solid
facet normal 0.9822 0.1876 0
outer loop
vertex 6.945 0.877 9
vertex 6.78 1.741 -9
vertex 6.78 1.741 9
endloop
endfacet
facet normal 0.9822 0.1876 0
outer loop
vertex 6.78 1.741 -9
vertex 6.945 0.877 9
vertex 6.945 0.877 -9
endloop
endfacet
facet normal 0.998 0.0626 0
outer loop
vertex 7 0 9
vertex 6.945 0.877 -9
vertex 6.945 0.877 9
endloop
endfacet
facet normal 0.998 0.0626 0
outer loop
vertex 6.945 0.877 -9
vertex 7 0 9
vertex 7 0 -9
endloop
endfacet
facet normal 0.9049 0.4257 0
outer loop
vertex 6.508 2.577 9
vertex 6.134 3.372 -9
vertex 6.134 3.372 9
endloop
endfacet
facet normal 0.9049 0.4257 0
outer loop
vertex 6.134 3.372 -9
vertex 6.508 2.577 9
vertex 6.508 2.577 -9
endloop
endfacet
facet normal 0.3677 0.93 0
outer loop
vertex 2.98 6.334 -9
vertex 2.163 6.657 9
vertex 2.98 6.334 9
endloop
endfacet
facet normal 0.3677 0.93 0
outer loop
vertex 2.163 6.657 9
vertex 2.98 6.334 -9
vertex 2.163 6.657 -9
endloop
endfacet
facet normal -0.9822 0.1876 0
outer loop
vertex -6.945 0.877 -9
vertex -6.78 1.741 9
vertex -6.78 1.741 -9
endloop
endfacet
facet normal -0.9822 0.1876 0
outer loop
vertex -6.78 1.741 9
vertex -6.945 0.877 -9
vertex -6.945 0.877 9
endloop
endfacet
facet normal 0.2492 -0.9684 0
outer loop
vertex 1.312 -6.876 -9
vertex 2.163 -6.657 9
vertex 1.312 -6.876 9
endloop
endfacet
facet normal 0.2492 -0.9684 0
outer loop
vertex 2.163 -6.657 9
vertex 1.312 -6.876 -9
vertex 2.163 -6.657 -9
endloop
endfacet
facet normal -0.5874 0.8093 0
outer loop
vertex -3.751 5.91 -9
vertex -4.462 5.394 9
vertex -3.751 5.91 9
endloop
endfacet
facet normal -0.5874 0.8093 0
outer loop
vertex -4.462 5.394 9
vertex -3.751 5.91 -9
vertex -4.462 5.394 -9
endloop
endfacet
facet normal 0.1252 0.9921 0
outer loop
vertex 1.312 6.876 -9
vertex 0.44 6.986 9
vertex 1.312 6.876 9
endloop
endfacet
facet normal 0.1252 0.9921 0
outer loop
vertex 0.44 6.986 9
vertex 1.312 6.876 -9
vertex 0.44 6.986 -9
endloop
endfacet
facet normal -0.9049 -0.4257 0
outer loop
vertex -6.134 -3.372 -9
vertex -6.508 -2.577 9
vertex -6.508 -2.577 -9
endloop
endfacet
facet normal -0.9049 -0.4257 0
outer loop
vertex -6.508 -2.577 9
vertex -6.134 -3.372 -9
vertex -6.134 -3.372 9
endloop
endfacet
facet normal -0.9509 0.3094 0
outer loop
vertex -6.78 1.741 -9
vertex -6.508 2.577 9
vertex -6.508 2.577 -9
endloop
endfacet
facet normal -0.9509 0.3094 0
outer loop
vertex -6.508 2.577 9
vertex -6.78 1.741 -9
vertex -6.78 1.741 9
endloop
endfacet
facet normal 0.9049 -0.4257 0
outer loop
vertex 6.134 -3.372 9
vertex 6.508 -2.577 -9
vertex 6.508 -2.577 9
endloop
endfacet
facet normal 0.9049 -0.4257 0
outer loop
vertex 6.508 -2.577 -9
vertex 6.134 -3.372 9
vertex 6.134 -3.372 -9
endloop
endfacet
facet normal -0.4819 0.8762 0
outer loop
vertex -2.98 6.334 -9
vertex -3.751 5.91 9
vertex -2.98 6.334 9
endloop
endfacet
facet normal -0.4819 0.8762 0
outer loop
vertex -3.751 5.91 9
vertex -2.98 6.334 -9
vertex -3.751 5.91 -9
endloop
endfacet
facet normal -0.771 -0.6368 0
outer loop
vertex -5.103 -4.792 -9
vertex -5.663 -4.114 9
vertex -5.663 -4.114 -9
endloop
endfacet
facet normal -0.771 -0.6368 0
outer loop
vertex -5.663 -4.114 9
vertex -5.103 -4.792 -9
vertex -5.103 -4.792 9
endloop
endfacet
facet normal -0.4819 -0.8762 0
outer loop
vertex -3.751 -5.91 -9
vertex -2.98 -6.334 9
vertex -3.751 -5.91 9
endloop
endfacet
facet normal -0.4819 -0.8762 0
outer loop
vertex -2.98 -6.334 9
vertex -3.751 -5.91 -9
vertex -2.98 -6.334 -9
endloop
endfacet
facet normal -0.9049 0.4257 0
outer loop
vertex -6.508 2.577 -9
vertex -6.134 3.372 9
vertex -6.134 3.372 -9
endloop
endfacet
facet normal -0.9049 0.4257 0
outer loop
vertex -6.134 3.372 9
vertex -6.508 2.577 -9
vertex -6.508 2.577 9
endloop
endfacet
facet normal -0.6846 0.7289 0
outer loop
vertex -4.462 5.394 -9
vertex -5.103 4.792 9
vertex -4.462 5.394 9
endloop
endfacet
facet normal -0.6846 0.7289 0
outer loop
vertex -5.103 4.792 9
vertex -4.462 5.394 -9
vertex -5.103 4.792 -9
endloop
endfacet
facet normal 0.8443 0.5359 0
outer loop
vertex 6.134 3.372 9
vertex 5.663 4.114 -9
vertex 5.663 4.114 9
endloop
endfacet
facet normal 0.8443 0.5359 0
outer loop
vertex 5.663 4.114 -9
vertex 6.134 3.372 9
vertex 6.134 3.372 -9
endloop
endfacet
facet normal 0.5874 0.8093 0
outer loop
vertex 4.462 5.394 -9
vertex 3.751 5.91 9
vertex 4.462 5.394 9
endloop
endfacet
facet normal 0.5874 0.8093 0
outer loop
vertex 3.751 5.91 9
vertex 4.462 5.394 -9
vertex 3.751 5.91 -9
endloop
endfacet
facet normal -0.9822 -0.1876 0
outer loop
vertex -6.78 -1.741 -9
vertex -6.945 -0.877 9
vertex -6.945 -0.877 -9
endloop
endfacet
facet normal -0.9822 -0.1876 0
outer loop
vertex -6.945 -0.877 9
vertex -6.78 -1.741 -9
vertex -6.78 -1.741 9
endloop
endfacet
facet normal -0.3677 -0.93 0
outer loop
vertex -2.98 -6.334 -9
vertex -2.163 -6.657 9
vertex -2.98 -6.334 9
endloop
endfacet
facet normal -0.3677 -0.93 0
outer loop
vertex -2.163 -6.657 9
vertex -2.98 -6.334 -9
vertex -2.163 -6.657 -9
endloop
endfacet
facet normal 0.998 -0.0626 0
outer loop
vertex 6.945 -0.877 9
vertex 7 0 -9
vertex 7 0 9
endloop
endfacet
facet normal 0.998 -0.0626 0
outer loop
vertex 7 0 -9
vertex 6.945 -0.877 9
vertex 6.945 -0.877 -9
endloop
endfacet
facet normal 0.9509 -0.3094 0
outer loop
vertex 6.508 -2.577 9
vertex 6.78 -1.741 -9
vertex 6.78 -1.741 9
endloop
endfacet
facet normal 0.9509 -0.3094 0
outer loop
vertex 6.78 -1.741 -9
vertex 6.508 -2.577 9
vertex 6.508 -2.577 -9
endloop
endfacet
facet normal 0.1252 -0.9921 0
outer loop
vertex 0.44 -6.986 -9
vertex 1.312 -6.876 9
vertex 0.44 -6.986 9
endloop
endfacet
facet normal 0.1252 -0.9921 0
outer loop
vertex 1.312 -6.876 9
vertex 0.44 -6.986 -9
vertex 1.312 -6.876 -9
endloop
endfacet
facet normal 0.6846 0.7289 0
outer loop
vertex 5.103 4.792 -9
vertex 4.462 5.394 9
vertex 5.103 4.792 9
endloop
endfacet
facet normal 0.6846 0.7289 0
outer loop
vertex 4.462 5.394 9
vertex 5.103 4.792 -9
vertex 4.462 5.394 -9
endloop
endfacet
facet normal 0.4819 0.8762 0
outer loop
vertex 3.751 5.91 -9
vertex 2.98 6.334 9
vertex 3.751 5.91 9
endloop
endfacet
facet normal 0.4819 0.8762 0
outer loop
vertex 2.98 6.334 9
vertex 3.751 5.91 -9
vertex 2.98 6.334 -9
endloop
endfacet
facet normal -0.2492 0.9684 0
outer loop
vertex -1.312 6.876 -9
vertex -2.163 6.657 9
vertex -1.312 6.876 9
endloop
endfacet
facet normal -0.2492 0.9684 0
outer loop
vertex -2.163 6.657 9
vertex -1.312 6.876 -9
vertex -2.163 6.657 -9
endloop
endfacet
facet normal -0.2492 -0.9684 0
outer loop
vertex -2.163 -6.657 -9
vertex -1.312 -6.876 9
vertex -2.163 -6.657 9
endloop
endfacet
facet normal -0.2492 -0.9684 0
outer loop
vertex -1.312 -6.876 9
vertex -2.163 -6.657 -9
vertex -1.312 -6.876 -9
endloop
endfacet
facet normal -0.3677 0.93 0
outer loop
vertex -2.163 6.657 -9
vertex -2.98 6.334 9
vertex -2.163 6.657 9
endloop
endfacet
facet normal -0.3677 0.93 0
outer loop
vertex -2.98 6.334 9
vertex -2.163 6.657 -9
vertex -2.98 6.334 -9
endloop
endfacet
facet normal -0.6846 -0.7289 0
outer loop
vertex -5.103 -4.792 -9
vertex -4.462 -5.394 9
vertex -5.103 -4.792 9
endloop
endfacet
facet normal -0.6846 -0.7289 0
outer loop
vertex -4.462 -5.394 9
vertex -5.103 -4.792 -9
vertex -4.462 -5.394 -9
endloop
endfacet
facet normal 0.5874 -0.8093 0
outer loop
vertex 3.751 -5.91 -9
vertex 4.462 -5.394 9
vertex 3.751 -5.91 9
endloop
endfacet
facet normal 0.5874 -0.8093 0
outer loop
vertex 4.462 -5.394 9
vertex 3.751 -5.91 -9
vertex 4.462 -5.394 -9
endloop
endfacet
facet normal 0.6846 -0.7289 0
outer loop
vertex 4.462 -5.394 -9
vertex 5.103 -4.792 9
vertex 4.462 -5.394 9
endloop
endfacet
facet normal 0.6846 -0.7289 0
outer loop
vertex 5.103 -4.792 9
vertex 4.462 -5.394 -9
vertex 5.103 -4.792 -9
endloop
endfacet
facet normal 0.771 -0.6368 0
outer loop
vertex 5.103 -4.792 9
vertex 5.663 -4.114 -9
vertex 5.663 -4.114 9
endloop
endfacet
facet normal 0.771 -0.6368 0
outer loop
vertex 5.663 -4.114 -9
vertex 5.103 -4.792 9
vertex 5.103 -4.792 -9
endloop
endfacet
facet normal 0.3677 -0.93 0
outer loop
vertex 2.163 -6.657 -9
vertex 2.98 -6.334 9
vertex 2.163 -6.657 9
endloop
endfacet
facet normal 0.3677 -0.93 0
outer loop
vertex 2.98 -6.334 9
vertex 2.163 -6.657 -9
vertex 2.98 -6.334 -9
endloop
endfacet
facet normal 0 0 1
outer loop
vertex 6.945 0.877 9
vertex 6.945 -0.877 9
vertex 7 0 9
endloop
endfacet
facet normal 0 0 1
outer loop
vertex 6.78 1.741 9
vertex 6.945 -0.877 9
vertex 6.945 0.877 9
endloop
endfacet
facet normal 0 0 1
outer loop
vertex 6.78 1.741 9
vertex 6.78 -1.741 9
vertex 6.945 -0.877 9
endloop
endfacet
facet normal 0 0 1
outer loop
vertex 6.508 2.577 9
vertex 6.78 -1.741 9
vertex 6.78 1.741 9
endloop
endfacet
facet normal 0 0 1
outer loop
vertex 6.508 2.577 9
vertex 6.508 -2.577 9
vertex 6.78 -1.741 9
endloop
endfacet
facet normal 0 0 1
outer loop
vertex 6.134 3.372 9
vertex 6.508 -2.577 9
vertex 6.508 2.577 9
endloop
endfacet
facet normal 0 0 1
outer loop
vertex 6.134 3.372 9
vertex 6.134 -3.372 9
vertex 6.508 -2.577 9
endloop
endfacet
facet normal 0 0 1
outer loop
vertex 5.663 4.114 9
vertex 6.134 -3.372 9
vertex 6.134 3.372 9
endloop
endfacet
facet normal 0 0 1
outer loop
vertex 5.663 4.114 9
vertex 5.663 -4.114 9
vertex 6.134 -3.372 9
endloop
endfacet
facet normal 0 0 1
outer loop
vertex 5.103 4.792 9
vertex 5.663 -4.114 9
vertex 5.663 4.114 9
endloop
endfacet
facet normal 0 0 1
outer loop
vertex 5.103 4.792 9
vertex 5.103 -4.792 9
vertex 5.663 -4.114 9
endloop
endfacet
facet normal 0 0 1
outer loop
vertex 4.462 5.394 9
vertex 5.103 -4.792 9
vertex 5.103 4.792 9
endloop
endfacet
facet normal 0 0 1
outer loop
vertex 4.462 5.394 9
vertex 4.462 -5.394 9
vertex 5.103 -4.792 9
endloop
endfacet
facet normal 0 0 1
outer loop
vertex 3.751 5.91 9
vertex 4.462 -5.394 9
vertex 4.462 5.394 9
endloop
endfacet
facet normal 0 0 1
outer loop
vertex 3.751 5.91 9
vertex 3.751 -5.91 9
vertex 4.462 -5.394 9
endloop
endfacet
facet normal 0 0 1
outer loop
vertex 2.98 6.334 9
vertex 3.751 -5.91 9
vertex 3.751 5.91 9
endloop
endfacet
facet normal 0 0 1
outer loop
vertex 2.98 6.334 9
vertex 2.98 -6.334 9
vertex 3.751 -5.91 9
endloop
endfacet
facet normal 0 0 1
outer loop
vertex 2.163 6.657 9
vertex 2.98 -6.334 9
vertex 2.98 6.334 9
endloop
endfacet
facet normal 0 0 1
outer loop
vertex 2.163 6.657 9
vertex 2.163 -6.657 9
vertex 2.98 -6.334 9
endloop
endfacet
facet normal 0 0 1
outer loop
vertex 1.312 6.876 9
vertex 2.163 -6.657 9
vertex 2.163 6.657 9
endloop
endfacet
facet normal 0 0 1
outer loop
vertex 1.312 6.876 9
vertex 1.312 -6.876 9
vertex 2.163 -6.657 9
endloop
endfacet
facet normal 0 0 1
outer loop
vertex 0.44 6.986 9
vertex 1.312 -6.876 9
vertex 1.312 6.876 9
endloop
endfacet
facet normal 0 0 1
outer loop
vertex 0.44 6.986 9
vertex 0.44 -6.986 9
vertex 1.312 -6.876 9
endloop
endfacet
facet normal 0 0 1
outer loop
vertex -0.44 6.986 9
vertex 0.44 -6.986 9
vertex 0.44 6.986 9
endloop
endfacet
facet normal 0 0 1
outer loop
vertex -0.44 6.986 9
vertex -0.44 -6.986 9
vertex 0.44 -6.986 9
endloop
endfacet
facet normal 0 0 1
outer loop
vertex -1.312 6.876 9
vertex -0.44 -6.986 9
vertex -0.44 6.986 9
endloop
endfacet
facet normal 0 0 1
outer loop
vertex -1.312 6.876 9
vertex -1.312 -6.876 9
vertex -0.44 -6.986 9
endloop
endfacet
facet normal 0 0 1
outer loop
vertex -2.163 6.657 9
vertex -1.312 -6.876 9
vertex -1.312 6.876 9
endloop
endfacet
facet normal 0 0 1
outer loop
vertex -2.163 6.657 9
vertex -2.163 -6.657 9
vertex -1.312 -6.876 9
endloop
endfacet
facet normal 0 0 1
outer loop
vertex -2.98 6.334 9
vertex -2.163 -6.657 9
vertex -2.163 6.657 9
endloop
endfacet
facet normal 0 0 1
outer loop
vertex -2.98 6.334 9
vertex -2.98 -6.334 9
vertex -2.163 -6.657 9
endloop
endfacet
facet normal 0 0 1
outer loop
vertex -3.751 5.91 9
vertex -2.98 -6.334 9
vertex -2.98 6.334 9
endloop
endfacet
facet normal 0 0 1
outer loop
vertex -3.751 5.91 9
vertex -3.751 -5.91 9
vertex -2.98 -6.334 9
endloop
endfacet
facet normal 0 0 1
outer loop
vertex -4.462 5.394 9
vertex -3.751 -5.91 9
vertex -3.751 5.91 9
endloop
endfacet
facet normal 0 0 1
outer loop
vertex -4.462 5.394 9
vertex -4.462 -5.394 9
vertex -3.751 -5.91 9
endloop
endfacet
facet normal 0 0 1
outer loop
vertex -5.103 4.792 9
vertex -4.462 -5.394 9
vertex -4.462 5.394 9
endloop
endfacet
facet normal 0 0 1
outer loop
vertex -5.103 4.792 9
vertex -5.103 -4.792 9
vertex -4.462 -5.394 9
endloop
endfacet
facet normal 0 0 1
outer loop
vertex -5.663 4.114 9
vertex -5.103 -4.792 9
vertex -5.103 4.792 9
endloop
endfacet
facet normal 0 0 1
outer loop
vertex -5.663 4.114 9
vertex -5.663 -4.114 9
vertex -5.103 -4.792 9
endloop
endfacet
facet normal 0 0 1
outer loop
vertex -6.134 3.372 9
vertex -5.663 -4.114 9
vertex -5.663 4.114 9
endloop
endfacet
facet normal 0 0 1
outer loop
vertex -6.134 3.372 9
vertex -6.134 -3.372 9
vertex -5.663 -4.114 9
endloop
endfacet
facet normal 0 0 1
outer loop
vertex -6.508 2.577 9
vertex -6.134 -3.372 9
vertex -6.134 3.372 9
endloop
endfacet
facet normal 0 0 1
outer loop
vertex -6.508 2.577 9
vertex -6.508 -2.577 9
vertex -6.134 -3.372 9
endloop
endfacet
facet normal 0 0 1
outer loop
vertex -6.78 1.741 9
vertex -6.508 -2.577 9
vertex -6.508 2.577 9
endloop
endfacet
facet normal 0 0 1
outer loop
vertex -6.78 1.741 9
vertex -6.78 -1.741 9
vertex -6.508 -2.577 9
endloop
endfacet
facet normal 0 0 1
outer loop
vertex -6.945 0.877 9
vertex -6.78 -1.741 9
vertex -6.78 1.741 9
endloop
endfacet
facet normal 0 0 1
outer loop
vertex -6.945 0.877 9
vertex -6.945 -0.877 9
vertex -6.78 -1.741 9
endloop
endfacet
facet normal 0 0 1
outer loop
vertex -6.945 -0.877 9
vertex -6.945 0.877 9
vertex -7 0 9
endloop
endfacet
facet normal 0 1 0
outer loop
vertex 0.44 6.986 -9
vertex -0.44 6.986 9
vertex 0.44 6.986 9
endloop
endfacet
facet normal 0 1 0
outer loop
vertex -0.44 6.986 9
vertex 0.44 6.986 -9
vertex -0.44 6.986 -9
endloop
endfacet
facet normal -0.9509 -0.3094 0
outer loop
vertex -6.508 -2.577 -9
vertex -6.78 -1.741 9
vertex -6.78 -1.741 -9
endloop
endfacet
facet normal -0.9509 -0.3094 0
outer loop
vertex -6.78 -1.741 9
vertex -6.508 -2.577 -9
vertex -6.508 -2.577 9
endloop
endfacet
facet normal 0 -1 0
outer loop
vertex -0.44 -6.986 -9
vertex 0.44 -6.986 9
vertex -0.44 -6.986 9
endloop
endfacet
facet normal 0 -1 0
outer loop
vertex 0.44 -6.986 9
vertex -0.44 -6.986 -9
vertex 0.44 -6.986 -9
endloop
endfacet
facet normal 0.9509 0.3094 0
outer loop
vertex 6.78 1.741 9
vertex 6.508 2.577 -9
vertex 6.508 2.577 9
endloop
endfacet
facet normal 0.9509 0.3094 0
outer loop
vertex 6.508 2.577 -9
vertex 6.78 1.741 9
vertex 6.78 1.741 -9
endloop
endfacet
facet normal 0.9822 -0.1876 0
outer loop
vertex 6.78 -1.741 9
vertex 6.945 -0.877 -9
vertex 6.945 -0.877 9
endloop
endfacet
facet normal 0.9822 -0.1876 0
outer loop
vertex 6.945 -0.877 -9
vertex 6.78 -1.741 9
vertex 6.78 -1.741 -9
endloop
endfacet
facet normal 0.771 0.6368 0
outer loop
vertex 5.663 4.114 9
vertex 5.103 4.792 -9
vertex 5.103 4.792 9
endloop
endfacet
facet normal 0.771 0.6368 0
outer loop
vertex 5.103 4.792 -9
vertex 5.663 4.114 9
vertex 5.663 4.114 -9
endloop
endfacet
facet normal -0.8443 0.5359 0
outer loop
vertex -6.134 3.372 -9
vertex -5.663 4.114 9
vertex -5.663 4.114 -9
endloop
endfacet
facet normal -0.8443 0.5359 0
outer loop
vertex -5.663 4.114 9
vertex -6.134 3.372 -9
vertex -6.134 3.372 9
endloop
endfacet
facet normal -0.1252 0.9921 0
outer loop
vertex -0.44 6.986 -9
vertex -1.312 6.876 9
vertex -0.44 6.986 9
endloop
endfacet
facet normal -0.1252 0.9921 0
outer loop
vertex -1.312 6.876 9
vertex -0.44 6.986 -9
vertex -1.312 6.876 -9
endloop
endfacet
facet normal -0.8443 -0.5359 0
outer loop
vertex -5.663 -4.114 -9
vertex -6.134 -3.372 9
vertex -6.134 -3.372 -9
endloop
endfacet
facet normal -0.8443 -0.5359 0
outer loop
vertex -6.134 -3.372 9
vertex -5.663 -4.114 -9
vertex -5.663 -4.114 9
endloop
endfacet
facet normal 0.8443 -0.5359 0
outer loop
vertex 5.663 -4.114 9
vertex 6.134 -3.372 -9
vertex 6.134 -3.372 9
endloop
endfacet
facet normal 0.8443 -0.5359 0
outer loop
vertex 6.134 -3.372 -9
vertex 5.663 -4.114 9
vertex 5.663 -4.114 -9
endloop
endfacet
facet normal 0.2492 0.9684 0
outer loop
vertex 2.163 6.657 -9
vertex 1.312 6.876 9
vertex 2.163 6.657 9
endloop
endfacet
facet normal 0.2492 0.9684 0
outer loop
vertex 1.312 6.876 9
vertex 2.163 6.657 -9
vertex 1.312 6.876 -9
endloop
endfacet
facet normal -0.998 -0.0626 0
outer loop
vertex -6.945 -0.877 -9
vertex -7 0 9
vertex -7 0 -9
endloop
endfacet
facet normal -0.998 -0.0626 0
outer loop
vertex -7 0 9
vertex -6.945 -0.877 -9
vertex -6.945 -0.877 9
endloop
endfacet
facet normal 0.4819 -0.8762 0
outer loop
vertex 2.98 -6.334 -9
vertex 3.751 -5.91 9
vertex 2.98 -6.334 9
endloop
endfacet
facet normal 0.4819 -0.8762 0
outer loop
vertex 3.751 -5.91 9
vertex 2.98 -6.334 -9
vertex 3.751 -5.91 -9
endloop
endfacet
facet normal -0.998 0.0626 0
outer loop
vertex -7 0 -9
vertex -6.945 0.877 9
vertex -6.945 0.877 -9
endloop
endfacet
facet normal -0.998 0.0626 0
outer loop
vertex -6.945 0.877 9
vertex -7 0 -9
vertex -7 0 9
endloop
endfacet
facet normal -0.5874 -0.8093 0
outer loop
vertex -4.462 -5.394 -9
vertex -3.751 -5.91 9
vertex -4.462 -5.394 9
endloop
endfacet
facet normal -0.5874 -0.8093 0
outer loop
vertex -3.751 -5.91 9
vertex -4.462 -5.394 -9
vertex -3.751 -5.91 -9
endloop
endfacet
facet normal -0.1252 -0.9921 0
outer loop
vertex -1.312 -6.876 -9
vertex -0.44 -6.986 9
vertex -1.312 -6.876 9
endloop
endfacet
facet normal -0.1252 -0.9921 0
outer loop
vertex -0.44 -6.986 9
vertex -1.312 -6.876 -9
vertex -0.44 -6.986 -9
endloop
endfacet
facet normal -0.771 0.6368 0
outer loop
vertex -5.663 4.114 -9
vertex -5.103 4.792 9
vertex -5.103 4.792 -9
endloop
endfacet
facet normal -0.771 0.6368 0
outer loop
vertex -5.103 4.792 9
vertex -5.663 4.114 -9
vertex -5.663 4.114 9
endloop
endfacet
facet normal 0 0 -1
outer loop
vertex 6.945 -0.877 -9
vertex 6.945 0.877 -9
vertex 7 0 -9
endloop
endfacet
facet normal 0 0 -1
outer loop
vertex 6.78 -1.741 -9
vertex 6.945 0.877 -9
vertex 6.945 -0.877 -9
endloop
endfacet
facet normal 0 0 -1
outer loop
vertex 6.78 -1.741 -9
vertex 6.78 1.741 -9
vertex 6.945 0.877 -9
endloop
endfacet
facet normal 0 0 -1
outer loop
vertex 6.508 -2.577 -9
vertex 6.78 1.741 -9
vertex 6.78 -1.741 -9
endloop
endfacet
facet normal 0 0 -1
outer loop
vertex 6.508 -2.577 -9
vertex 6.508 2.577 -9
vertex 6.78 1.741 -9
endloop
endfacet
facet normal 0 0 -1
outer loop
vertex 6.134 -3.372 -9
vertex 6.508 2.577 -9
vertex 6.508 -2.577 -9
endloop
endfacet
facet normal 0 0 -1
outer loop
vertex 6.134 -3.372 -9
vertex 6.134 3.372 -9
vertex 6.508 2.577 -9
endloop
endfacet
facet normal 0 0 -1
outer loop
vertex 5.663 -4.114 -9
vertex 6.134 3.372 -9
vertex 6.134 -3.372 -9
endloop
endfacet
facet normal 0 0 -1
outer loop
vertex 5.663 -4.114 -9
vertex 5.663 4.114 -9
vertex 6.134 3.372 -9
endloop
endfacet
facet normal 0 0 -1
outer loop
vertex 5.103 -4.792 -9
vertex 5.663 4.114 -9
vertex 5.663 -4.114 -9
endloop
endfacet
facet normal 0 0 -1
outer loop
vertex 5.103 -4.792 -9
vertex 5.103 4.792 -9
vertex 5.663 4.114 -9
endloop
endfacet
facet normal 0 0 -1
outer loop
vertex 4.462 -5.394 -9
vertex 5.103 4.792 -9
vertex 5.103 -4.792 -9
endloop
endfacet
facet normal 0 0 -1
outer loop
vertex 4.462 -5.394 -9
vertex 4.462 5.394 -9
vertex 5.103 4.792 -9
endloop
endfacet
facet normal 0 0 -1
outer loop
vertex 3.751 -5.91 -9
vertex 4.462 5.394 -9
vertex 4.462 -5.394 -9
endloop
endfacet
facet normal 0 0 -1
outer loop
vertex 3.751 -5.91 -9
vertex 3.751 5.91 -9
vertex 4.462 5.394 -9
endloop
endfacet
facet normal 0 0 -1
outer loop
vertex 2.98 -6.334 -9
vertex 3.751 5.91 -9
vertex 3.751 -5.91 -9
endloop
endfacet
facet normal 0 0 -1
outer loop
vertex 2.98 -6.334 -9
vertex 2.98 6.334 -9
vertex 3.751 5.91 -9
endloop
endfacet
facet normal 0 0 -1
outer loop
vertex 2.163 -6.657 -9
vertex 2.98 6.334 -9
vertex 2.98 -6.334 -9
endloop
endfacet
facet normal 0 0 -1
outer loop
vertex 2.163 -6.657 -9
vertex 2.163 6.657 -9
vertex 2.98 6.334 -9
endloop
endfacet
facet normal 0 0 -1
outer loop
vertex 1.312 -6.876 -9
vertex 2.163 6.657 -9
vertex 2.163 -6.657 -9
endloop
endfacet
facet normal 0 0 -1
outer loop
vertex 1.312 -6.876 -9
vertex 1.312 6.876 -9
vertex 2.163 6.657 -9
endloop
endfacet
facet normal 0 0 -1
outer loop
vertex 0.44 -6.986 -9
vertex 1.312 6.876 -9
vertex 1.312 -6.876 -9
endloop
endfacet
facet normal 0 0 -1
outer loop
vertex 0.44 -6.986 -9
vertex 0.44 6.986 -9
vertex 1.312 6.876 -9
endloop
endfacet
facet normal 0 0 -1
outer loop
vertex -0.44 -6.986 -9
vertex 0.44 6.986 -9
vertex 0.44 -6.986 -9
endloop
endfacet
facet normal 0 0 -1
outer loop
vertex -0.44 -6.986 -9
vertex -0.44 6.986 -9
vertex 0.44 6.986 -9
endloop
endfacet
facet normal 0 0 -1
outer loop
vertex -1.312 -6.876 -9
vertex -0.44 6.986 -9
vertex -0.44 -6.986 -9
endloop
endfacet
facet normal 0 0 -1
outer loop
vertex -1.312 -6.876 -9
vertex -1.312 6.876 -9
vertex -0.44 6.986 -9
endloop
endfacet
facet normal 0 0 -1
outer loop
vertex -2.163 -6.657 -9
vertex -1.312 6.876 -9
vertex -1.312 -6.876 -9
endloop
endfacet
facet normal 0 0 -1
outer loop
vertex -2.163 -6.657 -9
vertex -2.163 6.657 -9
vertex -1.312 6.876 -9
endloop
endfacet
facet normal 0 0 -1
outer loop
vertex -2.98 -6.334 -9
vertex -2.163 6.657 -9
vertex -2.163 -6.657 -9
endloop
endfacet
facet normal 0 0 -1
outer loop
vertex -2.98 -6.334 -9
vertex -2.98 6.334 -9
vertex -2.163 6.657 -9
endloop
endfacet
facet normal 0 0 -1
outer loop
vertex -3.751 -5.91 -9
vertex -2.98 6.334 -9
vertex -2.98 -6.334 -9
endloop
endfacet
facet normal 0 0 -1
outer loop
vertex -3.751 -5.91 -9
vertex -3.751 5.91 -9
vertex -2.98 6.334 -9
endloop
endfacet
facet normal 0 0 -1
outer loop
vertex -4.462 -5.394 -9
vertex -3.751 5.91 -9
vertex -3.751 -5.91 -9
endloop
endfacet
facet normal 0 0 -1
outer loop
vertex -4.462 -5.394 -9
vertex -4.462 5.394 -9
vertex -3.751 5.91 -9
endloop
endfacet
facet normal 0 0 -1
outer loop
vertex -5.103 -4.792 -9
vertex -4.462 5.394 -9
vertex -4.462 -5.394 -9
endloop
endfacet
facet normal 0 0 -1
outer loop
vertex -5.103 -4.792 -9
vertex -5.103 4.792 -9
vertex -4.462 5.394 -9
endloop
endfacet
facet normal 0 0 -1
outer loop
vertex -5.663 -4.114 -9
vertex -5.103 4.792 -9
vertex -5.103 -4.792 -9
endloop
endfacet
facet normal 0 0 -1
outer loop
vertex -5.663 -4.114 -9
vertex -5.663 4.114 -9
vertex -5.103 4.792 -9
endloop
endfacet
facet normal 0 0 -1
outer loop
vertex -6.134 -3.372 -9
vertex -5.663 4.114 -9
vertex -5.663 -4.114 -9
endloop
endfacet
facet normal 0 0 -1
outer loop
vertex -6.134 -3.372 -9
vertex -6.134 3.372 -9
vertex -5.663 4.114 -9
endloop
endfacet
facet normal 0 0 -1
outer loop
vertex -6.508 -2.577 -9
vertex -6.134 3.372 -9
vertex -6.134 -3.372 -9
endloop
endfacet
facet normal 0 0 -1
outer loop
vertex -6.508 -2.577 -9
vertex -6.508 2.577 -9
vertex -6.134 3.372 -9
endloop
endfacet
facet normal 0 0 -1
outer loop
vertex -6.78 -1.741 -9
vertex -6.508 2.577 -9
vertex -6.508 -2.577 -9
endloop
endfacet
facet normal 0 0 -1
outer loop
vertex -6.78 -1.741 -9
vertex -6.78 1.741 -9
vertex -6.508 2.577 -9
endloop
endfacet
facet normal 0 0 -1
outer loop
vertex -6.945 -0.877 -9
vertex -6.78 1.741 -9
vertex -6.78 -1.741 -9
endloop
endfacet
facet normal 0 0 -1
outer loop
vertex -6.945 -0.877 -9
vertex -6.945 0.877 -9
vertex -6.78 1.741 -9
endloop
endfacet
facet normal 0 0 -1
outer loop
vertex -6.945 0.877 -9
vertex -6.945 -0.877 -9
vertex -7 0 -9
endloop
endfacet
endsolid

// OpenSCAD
$fn = 50;

difference() {
	union() {
		translate(v = [0, 0, -9.0]) {
			cylinder(h = 18, r = 7);
		}
	}
	union();
}
